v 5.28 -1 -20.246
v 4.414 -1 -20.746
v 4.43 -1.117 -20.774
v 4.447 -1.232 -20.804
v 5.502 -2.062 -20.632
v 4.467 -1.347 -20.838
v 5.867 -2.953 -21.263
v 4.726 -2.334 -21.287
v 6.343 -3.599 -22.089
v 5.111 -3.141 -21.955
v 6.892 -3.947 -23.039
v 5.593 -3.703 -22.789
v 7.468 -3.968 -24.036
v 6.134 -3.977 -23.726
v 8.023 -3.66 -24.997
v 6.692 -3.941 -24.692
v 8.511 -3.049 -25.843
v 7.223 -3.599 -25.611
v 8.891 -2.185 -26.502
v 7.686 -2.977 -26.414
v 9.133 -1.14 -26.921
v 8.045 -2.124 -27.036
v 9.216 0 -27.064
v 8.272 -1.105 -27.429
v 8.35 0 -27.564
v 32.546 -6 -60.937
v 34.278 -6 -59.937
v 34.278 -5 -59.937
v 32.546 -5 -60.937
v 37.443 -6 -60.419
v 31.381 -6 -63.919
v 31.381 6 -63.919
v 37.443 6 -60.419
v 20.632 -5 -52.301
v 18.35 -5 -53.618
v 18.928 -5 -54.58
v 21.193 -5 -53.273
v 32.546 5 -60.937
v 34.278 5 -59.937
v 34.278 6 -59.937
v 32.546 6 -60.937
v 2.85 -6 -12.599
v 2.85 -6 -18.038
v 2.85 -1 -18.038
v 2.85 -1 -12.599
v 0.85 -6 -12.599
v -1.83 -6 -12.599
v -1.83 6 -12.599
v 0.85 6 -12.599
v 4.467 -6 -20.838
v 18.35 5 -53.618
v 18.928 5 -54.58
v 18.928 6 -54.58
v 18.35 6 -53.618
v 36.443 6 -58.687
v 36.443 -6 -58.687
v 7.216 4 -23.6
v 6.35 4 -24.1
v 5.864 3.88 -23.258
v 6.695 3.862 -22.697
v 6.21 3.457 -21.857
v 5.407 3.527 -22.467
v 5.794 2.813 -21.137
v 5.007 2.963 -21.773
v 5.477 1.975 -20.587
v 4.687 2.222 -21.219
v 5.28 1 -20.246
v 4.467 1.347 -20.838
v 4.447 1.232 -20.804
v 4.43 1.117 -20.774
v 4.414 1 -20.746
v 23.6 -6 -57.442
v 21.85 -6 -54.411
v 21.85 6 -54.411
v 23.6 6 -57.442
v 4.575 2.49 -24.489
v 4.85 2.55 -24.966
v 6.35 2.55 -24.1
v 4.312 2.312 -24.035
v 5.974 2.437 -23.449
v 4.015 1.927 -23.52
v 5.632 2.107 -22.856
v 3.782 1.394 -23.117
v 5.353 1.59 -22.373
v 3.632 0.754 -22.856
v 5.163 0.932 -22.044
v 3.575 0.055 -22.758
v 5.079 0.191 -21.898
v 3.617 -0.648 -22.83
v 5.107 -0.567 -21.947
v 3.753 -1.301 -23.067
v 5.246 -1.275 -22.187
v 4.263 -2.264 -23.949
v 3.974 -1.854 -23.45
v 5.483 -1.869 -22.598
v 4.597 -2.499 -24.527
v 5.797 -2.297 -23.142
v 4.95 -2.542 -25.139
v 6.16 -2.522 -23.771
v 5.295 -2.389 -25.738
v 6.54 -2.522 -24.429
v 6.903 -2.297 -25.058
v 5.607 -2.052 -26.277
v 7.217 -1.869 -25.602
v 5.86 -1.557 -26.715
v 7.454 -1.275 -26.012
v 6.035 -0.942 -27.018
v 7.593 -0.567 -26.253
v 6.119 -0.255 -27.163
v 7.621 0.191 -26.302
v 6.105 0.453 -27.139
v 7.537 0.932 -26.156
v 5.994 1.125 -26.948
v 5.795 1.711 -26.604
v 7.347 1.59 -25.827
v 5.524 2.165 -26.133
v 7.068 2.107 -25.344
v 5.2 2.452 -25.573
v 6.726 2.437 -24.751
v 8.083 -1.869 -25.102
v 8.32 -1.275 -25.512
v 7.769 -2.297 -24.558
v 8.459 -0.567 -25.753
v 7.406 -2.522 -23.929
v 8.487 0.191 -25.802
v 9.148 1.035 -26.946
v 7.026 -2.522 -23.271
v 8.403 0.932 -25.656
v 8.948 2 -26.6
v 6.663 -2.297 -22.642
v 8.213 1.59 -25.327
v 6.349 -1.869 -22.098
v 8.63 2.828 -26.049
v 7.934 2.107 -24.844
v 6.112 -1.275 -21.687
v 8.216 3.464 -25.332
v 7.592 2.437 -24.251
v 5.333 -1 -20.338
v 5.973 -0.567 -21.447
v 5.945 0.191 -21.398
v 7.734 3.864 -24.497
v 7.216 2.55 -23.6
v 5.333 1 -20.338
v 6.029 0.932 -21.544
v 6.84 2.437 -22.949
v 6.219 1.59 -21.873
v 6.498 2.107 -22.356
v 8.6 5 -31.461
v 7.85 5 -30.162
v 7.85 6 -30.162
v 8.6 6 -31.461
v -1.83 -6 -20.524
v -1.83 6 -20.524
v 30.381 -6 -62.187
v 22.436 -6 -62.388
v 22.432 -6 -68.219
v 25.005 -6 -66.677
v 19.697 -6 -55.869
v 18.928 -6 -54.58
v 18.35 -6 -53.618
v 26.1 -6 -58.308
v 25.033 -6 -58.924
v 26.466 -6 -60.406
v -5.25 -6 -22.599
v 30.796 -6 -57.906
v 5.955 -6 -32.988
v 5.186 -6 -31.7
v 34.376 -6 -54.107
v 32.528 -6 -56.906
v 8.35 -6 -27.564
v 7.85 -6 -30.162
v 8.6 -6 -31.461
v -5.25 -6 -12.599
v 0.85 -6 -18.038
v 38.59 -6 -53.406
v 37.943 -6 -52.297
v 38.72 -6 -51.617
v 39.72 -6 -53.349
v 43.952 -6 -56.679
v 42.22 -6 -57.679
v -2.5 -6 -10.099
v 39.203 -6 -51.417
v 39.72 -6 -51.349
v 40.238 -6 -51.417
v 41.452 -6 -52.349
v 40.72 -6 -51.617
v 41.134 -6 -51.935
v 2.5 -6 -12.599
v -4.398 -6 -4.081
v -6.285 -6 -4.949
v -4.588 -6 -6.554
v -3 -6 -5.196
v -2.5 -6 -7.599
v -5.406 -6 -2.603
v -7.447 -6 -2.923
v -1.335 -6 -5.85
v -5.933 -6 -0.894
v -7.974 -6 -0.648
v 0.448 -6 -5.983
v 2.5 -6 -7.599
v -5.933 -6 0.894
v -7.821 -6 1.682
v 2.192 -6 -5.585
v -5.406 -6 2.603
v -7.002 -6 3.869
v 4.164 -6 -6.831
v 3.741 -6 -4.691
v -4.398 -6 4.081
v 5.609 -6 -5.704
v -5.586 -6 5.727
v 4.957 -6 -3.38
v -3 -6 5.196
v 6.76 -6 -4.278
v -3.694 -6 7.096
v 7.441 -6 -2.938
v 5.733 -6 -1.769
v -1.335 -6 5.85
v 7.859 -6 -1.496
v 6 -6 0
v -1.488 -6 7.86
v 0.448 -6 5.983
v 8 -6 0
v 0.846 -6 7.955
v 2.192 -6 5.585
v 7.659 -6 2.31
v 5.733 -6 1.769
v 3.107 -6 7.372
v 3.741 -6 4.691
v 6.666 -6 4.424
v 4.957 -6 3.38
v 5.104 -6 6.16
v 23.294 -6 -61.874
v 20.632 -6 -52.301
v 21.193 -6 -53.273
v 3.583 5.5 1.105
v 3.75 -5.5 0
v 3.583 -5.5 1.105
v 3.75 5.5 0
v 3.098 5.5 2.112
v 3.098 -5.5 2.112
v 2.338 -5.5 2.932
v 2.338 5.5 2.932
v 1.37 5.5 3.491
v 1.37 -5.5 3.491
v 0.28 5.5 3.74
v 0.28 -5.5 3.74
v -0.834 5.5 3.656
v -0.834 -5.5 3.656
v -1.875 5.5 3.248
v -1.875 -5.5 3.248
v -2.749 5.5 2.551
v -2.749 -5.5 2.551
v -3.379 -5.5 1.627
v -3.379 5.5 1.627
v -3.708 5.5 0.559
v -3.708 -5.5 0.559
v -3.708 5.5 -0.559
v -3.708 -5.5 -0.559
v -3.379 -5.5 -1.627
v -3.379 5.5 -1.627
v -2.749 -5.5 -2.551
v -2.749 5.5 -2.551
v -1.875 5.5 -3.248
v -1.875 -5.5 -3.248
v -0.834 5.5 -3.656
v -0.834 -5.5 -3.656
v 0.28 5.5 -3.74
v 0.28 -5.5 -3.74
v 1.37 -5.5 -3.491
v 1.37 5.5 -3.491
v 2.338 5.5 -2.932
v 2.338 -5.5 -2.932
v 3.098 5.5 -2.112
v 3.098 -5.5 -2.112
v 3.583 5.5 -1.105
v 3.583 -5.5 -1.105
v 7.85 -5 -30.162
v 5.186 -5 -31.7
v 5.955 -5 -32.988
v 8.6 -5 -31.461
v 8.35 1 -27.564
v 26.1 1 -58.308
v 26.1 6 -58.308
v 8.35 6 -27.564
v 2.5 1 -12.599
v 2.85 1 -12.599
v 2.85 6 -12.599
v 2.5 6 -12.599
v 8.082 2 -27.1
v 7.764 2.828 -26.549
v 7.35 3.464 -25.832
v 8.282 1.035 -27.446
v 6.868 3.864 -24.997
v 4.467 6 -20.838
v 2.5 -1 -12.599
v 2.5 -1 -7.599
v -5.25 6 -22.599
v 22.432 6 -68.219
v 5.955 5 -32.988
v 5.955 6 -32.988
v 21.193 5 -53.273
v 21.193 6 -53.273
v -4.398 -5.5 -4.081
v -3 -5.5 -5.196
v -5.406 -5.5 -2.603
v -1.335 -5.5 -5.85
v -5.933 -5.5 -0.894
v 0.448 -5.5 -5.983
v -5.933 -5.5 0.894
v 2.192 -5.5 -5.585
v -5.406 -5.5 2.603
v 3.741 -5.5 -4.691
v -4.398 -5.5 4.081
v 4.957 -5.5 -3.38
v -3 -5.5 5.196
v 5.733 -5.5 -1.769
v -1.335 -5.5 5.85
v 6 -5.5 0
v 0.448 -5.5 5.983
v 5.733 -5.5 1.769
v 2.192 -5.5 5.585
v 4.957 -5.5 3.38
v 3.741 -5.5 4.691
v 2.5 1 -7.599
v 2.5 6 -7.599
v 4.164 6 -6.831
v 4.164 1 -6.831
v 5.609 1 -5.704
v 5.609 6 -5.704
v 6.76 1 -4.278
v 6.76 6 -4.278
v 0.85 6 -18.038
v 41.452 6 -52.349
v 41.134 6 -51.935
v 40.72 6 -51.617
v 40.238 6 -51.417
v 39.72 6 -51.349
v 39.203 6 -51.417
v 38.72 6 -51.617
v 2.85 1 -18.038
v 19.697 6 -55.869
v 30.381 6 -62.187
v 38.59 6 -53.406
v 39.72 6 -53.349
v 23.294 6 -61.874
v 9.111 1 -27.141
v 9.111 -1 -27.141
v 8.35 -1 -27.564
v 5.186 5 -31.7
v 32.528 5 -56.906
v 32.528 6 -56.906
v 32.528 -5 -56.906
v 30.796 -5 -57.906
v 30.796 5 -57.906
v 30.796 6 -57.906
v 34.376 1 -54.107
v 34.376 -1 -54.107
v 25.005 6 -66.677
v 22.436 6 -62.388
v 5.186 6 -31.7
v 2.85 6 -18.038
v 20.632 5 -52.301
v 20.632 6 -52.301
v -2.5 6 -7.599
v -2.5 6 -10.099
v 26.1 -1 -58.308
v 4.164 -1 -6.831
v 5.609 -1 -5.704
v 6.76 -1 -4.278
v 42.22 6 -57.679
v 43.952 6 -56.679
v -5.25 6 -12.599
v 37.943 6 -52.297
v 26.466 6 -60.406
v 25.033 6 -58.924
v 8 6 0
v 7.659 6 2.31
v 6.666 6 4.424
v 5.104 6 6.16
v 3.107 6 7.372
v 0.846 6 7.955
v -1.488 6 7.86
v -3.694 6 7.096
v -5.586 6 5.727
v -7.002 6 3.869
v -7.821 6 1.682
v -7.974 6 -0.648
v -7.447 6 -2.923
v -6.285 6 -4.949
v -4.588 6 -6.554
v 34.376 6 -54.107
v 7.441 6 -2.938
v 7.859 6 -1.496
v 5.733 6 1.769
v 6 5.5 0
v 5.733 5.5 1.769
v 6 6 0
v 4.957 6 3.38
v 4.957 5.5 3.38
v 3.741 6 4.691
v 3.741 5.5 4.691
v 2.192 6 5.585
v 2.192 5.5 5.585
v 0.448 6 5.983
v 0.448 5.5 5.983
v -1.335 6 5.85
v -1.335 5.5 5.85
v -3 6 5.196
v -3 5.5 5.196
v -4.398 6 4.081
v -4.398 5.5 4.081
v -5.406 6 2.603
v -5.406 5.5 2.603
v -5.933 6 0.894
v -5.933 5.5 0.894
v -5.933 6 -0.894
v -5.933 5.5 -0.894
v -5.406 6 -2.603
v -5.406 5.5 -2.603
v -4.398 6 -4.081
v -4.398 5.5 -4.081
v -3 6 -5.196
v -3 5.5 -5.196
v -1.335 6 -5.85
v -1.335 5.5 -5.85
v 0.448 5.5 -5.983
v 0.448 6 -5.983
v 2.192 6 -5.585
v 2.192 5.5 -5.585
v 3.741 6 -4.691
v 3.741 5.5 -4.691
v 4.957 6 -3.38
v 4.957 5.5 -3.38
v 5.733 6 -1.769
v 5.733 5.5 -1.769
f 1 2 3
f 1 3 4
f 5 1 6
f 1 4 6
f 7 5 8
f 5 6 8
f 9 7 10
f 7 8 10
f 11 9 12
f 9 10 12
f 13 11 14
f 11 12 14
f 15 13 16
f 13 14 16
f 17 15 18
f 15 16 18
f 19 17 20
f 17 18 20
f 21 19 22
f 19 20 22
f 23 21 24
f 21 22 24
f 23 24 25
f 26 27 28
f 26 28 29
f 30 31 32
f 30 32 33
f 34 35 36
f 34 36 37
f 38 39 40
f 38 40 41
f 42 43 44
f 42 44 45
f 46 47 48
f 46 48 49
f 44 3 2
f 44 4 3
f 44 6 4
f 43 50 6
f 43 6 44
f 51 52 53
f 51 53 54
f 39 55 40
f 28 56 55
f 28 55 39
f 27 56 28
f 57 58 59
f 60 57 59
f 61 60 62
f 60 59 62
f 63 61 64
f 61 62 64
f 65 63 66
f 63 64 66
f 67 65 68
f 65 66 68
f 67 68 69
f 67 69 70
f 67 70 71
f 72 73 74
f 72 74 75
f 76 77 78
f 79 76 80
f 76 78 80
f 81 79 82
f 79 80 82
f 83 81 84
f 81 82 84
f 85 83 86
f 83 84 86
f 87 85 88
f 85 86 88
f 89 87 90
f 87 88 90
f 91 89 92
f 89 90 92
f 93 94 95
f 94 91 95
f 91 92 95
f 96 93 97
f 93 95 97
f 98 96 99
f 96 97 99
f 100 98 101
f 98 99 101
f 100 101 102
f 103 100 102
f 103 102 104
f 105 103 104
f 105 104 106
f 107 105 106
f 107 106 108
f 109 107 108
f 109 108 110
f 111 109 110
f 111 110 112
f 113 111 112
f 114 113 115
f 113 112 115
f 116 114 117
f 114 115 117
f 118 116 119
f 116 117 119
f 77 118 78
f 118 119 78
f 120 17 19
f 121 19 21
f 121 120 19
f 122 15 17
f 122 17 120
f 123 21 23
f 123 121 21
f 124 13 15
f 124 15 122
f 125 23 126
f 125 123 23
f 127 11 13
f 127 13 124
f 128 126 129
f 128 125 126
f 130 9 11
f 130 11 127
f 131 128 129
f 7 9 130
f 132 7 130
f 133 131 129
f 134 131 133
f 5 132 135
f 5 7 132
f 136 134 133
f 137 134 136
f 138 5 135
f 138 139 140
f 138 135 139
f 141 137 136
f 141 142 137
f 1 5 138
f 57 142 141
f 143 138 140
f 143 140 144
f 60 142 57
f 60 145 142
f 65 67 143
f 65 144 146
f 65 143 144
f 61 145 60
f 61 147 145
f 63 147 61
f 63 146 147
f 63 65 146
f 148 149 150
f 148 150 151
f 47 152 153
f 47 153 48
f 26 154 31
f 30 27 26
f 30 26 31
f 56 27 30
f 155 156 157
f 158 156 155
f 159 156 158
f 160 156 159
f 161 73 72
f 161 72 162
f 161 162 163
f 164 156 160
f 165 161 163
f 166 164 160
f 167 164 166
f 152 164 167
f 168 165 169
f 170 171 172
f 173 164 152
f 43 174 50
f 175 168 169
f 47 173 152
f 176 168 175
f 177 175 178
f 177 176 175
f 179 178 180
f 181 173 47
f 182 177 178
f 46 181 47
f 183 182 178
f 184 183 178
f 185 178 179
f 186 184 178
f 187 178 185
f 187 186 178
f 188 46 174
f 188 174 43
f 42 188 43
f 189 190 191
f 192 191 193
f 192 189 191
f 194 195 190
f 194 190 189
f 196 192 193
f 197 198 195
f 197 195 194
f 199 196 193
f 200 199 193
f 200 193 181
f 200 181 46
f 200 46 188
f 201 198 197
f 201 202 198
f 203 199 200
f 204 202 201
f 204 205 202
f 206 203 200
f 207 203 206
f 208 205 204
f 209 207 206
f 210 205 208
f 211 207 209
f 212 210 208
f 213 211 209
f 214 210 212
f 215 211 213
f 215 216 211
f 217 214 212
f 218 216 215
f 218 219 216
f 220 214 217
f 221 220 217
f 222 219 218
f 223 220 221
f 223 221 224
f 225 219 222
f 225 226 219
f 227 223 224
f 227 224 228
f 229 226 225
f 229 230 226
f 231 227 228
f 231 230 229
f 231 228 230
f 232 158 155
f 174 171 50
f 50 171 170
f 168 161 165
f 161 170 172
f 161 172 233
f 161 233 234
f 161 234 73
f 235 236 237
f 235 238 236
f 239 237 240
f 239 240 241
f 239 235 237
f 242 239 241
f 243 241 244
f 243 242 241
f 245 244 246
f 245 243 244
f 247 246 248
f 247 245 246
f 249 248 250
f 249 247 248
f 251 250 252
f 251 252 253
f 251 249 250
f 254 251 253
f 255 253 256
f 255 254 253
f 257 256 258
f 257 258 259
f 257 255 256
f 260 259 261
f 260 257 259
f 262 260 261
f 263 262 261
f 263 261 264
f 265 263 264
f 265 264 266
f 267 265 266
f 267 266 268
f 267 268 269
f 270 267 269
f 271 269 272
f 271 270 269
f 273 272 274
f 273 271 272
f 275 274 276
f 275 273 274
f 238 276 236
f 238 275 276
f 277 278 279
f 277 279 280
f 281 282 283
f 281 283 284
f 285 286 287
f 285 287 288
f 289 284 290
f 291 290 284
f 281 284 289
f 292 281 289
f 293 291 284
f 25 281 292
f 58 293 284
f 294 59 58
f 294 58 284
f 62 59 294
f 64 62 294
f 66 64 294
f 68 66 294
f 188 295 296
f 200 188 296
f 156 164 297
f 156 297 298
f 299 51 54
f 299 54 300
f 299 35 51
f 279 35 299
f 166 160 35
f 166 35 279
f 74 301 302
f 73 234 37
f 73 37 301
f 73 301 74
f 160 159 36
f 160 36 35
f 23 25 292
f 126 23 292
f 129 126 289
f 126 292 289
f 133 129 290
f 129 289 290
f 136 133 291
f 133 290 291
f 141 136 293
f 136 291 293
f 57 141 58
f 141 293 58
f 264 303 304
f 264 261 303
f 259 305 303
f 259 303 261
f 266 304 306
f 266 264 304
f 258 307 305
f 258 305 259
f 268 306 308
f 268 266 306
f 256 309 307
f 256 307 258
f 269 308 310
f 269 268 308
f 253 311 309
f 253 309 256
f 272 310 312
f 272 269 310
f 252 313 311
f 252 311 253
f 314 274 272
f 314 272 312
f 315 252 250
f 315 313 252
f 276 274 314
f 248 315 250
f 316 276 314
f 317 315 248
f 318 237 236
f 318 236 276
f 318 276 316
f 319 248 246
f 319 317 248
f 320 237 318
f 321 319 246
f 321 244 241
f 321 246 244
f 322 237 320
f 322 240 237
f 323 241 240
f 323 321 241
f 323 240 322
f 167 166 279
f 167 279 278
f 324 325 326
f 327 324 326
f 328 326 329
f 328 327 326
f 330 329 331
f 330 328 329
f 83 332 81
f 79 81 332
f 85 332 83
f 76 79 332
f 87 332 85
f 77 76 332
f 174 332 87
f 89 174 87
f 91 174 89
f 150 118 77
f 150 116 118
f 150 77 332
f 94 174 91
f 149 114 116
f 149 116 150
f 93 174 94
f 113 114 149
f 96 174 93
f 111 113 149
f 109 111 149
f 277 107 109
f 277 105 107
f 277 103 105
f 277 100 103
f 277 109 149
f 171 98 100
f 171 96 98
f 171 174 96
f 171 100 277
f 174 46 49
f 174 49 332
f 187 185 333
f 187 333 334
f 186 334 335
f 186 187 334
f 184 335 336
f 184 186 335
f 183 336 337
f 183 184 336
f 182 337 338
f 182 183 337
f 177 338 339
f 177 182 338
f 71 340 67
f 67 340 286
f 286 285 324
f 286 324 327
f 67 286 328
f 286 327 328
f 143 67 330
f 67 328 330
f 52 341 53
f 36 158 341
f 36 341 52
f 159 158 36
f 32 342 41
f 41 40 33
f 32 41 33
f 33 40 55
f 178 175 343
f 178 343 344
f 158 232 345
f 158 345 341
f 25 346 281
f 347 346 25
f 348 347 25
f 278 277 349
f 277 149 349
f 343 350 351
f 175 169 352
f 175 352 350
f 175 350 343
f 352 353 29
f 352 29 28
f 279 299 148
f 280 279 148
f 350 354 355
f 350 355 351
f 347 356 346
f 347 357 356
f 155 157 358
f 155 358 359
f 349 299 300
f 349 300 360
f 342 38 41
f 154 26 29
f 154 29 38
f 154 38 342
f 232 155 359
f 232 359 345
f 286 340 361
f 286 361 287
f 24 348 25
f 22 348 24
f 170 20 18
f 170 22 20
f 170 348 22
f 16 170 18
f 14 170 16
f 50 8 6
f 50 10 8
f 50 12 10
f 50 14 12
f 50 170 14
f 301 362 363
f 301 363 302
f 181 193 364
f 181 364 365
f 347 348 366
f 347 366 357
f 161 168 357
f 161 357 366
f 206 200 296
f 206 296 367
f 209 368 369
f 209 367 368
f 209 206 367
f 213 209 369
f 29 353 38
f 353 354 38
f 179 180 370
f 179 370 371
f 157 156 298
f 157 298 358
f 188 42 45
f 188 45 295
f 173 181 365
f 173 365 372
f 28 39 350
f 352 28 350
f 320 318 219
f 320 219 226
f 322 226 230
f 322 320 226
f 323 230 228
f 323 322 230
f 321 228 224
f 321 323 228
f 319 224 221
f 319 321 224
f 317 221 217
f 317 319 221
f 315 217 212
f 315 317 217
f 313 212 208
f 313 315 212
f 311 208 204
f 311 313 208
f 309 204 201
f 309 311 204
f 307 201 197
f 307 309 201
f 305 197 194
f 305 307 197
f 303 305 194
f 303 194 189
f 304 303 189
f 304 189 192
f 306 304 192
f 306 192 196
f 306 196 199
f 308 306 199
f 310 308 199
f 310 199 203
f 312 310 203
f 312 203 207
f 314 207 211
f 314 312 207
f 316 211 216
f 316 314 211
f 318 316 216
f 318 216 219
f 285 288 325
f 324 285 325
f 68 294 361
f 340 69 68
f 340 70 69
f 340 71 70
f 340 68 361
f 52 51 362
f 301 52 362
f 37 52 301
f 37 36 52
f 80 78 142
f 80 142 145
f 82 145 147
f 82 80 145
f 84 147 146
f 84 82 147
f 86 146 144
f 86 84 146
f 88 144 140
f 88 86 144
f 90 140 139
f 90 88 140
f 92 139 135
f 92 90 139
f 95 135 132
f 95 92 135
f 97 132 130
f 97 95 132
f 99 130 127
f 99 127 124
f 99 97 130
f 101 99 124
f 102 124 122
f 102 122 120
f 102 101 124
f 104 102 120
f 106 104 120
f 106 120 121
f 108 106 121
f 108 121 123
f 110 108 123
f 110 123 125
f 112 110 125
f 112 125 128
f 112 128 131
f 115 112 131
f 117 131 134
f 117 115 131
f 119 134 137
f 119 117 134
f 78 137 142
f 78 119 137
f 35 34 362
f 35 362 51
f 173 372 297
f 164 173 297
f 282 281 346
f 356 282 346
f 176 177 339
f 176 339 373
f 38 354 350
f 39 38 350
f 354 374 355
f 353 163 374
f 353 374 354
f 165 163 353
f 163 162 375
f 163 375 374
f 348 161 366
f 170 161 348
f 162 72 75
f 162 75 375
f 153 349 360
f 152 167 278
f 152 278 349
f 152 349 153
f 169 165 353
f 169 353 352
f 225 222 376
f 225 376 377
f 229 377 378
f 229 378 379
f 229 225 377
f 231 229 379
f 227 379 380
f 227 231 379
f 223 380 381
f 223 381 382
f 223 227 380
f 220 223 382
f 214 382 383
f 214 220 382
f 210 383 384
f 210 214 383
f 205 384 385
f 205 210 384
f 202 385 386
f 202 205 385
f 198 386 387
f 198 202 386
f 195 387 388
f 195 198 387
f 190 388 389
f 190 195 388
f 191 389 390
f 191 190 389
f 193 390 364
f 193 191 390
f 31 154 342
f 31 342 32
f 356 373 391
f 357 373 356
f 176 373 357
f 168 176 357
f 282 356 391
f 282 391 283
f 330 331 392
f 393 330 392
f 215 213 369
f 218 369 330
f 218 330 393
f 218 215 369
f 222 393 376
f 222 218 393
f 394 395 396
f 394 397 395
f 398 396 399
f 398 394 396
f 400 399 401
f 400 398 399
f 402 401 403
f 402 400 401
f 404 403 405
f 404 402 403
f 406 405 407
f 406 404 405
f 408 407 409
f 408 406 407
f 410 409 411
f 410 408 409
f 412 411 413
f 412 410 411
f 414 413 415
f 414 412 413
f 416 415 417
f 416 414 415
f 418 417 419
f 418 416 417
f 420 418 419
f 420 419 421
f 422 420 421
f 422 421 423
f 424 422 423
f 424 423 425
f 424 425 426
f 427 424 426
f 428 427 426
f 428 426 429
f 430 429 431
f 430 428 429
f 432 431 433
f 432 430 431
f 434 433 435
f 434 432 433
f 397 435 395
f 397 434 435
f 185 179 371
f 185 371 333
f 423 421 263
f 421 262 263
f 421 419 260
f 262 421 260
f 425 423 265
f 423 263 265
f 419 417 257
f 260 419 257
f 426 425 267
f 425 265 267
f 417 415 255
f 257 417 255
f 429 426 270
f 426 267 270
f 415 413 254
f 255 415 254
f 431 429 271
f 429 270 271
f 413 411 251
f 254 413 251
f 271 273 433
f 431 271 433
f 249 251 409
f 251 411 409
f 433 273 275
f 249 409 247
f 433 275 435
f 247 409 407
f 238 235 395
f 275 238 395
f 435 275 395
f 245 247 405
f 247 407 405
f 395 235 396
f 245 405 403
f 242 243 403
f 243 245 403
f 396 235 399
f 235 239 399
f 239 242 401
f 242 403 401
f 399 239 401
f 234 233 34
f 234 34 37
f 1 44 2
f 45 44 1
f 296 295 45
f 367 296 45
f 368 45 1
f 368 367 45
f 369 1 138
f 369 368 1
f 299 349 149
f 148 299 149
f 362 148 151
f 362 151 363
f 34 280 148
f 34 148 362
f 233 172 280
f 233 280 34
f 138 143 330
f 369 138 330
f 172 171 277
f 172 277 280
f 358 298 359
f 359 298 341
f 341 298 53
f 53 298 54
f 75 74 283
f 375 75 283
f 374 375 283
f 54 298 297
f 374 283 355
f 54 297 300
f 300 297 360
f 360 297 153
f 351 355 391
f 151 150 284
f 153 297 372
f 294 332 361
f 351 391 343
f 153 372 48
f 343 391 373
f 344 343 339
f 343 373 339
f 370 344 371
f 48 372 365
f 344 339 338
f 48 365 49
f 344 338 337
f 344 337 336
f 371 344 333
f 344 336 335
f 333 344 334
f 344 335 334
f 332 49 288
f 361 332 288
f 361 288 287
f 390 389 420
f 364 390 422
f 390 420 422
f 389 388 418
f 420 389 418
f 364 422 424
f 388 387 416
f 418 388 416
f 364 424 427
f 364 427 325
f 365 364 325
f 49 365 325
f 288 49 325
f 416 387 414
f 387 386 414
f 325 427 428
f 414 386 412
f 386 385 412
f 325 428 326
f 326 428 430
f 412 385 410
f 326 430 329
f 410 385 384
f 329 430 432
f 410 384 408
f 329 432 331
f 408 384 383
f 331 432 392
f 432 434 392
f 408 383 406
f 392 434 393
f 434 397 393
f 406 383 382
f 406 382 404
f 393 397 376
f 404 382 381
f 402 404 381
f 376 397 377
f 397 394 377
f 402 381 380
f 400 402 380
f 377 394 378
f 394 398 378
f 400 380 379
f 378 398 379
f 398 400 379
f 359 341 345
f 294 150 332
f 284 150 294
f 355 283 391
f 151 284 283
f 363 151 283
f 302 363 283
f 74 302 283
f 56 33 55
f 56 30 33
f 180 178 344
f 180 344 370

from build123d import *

# Parameters (mm, degrees)
F0_R     = 6
F1_DEPTH = 6
F2_DEPTH = 5
F0_R_2   = 3.75
F3_DEPTH = 5.5
F4_DEPTH = 1
F5_R     = 2.55
F6_DEPTH = 1
F7_DEPTH = 3


# Not quite as in the source:
# - a feature names something its author has since deleted; it is built from what else it names


with BuildPart() as f1:
    # F0 (on Front) → F1 (new body, symmetric)
    with BuildSketch(Plane.XZ):
        with BuildLine():
            ThreePointArc((6.7603327111, -4.2776046609), (7.6838356857, -2.2268069417), (8, 0))
            ThreePointArc((8, 0), (-4.6904157598, 6.4807406984), (-2.5, -7.5993420768))
            ThreePointArc((-2.5, -7.5993420768), (0, -8), (2.5, -7.5993420768))
            ThreePointArc((2.5, -7.5993420768), (4.9190370343, -6.3089677963), (6.7603327111, -4.2776046609))
        make_face()
        Circle(F0_R, mode=Mode.SUBTRACT)
        with BuildLine():
            ThreePointArc((2.5, -7.5993420768), (0, -8), (-2.5, -7.5993420768))
            Line((-2.5, -7.5993420768), (-2.5, -10.0993420768))
            Line((-2.5, -10.0993420768), (-2.5, -12.5993420768))
            Line((-2.5, -12.5993420768), (-1.8303241628, -12.5993420768))
            Line((-1.8303241628, -12.5993420768), (-1.25, -12.5993420768))
            Line((-1.25, -12.5993420768), (0, -12.5993420768))
            Line((0, -12.5993420768), (0.85, -12.5993420768))
            Line((0.85, -12.5993420768), (2.5, -12.5993420768))
            Line((2.5, -12.5993420768), (2.5, -7.5993420768))
        make_face()
        Polygon((-2.5, -12.5993420768), (-2.5, -10.0993420768), (-5.25, -12.5993420768), align=None)
        Polygon((2.85, -12.5993420768), (2.5, -12.5993420768), (0.85, -12.5993420768), (0.85, -18.0378015974), (2.85, -18.0378015974), align=None)
        Polygon((8.3499999998, -27.5640810386), (4.4667434126, -20.8380833309), (2.85, -18.0378015974), (0.85, -18.0378015974), (7.8499425387, -30.1621904255), (8.5998597667, -31.4610993824), (20.6315315697, -52.3007943349), (21.192894901, -53.2731147882), (21.8498235115, -54.4109609722), (23.5998091461, -57.4420581792), (25.0328148241, -58.9241157783), (26.1, -58.3079828733), align=None)
        with BuildLine():
            ThreePointArc((41.4522628248, -52.3492529341), (40.2378545238, -51.4173955261), (38.7202154867, -51.6171891785))
            Line((38.7202154867, -51.6171891785), (39.720207278, -53.3492447254))
            Line((39.720207278, -53.3492447254), (41.4522628248, -52.3492529341))
        make_face()
        Polygon((41.4522628248, -52.3492529341), (39.720207278, -53.3492447254), (42.2201867561, -57.6793835925), (43.9522423029, -56.6793918013), align=None)
        Polygon((-1.8303241628, -12.5993420768), (-2.5, -12.5993420768), (-5.25, -12.5993420768), (-5.25, -22.5993420768), (-1.8303241628, -20.5242957716), align=None)
        Polygon((-1.8303241628, -20.5242957716), (-5.25, -22.5993420768), (22.4316151512, -68.2186375255), (25.0052518507, -66.6770817727), (22.4359922626, -62.3876872736), (23.2938711624, -61.8738353559), (19.6969077391, -55.8686830572), (18.9284228965, -54.5804940001), (18.3501014099, -53.6179642353), (5.9549663233, -32.9881126107), (5.1864814807, -31.6999235536), align=None)
        Polygon((34.376104393, -54.107172761), (26.1, -58.3079828733), (25.0328148241, -58.9241157783), (26.4658205021, -60.4061733773), (30.7959593692, -57.9061938992), (32.5280149161, -56.906202108), (38.5902093302, -53.4062308387), (39.720207278, -53.3492447254), (38.7202154867, -51.6171891785), (37.9429287948, -52.2967132374), align=None)
    extrude(amount=F1_DEPTH, both=True)



with BuildPart() as f1b:
    # F0 (on Front) → F1, piece 2 (new body, symmetric)
    with BuildSketch(Plane.XZ):
        Polygon((34.2780005508, -59.937299315), (32.5459450039, -60.9372911063), (30.3808755703, -62.1872808453), (31.3808673616, -63.9193363922), (37.4430617756, -60.4193651228), (36.4430699844, -58.687309576), align=None)
    extrude(amount=F1_DEPTH, both=True)


with BuildPart() as f1_1:
    add(f1.part)

    add(f1b.part)  # F2 merges F1b
    # F0 (on Front) → F2 (join, symmetric)
    with BuildSketch(Plane.XZ):
        Polygon((32.5280149161, -56.906202108), (30.7959593692, -57.9061938992), (32.5459450039, -60.9372911063), (34.2780005508, -59.937299315), align=None)
        Polygon((8.5998597667, -31.4610993824), (7.8499425387, -30.1621904255), (5.1864814807, -31.6999235536), (5.9549663233, -32.9881126107), align=None)
        Polygon((21.192894901, -53.2731147882), (20.6315315697, -52.3007943349), (18.3501014099, -53.6179642353), (18.9284228965, -54.5804940001), align=None)
    extrude(amount=F2_DEPTH, both=True)

    # F0 (on Front) → F3 (join, symmetric)
    with BuildSketch(Plane.XZ):
        Circle(F0_R)
        Circle(F0_R_2, mode=Mode.SUBTRACT)
    extrude(amount=F3_DEPTH, both=True)

    # F0 (on Front) → F4 (join, symmetric)
    with BuildSketch(Plane.XZ):
        with BuildLine():
            Line((5.3327688164, -20.3380833309), (6.7603327111, -4.2776046609))
            ThreePointArc((6.7603327111, -4.2776046609), (4.9190370343, -6.3089677963), (2.5, -7.5993420768))
            Line((2.5, -7.5993420768), (2.5, -12.5993420768))
            Line((2.5, -12.5993420768), (2.85, -12.5993420768))
            Line((2.85, -12.5993420768), (2.85, -18.0378015974))
            Line((2.85, -18.0378015974), (4.4667434126, -20.8380833309))
            Line((4.4667434126, -20.8380833309), (5.3327688164, -20.3380833309))
        make_face()
        Polygon((9.1110238739, -27.1409636232), (8.3499999998, -27.5640810386), (26.1, -58.3079828733), (34.376104393, -54.107172761), align=None)
    extrude(amount=F4_DEPTH, both=True)

    # F5 (on face) → F6 (join)
    with BuildSketch(Plane(origin=(-5.6730972059, 0, -3.2753641989), x_dir=(0, 1, 0), z_dir=(0.8660254038, 0, 0.5))):
        with BuildLine():
            ThreePointArc((0, -28.0461944113), (2.8284271247, -26.8746215361), (4, -24.0461944113))
            ThreePointArc((4, -24.0461944113), (3.1622776602, -21.5967046686), (1, -20.1732110651))
            Line((1, -20.1732110651), (1, -20.279681237))
            Line((1, -20.279681237), (-1, -20.279681237))
            Line((-1, -20.279681237), (-1, -20.1732110651))
            ThreePointArc((-1, -20.1732110651), (-3.9681187851, -24.5502115813), (0, -28.0461944113))
        make_face()
        with Locations((0, -24.0461944113)):
            Circle(F5_R, mode=Mode.SUBTRACT)
    extrude(amount=F6_DEPTH)

    # F5 (on face) → F7 (cut)
    with BuildSketch(Plane(origin=(-5.6730972059, 0, -3.2753641989), x_dir=(0, 1, 0), z_dir=(0.8660254038, 0, 0.5))):
        with Locations((0, -24.0461944113)):
            Circle(F5_R)
    extrude(amount=-F7_DEPTH, mode=Mode.SUBTRACT)


solid = f1_1.part
